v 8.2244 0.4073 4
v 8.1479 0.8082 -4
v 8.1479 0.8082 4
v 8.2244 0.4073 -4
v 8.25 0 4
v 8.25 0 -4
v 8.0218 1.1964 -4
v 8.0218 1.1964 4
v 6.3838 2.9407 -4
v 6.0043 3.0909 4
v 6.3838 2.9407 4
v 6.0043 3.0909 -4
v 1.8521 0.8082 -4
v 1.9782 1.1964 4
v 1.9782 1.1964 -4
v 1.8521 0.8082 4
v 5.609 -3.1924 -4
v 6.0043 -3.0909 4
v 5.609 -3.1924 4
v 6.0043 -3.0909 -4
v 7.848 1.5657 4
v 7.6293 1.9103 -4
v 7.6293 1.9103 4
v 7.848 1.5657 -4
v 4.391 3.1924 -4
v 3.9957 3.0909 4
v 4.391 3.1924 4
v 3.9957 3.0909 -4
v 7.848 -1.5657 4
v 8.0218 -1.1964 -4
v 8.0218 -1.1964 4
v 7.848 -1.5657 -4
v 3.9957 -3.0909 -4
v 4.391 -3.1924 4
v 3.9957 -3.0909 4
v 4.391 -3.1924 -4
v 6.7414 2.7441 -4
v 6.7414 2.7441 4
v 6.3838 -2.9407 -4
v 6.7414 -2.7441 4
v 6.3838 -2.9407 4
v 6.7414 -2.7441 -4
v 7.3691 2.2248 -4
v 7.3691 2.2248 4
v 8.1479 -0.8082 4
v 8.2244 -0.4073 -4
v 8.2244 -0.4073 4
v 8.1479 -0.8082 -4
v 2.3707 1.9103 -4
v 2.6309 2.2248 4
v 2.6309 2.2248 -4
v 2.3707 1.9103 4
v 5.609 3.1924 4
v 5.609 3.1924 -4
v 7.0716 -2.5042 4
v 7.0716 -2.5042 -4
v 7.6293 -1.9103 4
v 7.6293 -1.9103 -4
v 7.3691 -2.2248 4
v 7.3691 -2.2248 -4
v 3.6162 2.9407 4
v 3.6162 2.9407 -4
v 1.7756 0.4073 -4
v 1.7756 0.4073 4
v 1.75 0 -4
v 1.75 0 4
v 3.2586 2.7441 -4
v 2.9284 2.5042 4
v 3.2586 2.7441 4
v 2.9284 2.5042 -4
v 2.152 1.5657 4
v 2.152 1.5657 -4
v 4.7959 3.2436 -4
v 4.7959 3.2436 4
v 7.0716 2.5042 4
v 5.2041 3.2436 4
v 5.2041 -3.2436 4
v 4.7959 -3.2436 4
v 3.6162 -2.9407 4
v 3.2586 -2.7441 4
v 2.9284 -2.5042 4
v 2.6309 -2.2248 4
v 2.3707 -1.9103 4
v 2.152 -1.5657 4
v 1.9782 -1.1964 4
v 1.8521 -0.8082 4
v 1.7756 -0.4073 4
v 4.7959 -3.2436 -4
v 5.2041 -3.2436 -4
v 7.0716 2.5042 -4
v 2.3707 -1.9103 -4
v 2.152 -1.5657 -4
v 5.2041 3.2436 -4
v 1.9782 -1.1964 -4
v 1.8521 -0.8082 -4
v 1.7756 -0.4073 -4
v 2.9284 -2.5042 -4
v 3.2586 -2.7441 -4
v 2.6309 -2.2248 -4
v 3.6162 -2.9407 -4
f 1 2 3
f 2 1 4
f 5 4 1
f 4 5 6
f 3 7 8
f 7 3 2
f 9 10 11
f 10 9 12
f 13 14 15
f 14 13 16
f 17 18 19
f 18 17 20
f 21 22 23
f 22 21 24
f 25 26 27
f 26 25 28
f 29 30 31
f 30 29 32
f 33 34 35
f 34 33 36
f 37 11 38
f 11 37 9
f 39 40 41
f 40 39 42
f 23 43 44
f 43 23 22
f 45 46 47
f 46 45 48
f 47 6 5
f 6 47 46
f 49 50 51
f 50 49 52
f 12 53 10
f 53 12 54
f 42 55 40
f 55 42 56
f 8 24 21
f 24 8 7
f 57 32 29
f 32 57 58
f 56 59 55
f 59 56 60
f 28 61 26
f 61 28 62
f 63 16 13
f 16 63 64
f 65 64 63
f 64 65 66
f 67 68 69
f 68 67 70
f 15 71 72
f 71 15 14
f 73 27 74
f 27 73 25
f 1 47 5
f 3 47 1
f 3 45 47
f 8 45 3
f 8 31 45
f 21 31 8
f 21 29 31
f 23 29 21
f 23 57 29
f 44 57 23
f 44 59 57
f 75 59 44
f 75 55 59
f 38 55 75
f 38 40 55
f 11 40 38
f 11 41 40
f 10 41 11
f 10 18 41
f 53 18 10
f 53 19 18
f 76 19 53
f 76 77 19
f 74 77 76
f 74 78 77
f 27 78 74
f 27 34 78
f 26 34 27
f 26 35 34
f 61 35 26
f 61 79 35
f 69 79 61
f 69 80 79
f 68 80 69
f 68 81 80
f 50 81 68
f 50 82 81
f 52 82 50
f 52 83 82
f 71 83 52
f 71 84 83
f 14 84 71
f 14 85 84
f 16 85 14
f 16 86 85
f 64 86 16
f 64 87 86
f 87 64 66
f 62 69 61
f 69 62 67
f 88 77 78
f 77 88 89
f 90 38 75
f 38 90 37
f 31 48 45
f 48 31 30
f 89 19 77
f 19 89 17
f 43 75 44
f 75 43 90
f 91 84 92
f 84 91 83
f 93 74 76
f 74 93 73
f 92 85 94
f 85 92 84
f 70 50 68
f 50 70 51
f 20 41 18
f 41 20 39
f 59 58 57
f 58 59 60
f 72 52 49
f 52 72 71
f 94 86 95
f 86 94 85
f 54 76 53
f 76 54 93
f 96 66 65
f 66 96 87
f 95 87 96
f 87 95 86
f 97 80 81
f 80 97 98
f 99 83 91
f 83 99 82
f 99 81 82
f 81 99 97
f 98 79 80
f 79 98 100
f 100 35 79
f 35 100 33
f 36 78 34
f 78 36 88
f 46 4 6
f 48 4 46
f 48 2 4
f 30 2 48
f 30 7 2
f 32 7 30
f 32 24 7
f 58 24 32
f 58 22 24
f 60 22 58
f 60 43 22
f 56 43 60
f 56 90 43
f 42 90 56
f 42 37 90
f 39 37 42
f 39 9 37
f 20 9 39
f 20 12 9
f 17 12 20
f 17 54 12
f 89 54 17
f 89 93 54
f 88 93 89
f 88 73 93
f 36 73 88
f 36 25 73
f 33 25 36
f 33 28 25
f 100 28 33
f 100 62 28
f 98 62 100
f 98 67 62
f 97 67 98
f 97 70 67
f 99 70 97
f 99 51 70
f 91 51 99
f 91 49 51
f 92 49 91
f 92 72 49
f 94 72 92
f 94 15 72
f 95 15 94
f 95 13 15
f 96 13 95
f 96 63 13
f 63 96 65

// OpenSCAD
$fn = 50;


difference() {
	union() {
		translate(v = [5, 0, -4.0000000000]) {
			cylinder(h = 8, r = 3.2500000000);
		}
	}
	union();
}
